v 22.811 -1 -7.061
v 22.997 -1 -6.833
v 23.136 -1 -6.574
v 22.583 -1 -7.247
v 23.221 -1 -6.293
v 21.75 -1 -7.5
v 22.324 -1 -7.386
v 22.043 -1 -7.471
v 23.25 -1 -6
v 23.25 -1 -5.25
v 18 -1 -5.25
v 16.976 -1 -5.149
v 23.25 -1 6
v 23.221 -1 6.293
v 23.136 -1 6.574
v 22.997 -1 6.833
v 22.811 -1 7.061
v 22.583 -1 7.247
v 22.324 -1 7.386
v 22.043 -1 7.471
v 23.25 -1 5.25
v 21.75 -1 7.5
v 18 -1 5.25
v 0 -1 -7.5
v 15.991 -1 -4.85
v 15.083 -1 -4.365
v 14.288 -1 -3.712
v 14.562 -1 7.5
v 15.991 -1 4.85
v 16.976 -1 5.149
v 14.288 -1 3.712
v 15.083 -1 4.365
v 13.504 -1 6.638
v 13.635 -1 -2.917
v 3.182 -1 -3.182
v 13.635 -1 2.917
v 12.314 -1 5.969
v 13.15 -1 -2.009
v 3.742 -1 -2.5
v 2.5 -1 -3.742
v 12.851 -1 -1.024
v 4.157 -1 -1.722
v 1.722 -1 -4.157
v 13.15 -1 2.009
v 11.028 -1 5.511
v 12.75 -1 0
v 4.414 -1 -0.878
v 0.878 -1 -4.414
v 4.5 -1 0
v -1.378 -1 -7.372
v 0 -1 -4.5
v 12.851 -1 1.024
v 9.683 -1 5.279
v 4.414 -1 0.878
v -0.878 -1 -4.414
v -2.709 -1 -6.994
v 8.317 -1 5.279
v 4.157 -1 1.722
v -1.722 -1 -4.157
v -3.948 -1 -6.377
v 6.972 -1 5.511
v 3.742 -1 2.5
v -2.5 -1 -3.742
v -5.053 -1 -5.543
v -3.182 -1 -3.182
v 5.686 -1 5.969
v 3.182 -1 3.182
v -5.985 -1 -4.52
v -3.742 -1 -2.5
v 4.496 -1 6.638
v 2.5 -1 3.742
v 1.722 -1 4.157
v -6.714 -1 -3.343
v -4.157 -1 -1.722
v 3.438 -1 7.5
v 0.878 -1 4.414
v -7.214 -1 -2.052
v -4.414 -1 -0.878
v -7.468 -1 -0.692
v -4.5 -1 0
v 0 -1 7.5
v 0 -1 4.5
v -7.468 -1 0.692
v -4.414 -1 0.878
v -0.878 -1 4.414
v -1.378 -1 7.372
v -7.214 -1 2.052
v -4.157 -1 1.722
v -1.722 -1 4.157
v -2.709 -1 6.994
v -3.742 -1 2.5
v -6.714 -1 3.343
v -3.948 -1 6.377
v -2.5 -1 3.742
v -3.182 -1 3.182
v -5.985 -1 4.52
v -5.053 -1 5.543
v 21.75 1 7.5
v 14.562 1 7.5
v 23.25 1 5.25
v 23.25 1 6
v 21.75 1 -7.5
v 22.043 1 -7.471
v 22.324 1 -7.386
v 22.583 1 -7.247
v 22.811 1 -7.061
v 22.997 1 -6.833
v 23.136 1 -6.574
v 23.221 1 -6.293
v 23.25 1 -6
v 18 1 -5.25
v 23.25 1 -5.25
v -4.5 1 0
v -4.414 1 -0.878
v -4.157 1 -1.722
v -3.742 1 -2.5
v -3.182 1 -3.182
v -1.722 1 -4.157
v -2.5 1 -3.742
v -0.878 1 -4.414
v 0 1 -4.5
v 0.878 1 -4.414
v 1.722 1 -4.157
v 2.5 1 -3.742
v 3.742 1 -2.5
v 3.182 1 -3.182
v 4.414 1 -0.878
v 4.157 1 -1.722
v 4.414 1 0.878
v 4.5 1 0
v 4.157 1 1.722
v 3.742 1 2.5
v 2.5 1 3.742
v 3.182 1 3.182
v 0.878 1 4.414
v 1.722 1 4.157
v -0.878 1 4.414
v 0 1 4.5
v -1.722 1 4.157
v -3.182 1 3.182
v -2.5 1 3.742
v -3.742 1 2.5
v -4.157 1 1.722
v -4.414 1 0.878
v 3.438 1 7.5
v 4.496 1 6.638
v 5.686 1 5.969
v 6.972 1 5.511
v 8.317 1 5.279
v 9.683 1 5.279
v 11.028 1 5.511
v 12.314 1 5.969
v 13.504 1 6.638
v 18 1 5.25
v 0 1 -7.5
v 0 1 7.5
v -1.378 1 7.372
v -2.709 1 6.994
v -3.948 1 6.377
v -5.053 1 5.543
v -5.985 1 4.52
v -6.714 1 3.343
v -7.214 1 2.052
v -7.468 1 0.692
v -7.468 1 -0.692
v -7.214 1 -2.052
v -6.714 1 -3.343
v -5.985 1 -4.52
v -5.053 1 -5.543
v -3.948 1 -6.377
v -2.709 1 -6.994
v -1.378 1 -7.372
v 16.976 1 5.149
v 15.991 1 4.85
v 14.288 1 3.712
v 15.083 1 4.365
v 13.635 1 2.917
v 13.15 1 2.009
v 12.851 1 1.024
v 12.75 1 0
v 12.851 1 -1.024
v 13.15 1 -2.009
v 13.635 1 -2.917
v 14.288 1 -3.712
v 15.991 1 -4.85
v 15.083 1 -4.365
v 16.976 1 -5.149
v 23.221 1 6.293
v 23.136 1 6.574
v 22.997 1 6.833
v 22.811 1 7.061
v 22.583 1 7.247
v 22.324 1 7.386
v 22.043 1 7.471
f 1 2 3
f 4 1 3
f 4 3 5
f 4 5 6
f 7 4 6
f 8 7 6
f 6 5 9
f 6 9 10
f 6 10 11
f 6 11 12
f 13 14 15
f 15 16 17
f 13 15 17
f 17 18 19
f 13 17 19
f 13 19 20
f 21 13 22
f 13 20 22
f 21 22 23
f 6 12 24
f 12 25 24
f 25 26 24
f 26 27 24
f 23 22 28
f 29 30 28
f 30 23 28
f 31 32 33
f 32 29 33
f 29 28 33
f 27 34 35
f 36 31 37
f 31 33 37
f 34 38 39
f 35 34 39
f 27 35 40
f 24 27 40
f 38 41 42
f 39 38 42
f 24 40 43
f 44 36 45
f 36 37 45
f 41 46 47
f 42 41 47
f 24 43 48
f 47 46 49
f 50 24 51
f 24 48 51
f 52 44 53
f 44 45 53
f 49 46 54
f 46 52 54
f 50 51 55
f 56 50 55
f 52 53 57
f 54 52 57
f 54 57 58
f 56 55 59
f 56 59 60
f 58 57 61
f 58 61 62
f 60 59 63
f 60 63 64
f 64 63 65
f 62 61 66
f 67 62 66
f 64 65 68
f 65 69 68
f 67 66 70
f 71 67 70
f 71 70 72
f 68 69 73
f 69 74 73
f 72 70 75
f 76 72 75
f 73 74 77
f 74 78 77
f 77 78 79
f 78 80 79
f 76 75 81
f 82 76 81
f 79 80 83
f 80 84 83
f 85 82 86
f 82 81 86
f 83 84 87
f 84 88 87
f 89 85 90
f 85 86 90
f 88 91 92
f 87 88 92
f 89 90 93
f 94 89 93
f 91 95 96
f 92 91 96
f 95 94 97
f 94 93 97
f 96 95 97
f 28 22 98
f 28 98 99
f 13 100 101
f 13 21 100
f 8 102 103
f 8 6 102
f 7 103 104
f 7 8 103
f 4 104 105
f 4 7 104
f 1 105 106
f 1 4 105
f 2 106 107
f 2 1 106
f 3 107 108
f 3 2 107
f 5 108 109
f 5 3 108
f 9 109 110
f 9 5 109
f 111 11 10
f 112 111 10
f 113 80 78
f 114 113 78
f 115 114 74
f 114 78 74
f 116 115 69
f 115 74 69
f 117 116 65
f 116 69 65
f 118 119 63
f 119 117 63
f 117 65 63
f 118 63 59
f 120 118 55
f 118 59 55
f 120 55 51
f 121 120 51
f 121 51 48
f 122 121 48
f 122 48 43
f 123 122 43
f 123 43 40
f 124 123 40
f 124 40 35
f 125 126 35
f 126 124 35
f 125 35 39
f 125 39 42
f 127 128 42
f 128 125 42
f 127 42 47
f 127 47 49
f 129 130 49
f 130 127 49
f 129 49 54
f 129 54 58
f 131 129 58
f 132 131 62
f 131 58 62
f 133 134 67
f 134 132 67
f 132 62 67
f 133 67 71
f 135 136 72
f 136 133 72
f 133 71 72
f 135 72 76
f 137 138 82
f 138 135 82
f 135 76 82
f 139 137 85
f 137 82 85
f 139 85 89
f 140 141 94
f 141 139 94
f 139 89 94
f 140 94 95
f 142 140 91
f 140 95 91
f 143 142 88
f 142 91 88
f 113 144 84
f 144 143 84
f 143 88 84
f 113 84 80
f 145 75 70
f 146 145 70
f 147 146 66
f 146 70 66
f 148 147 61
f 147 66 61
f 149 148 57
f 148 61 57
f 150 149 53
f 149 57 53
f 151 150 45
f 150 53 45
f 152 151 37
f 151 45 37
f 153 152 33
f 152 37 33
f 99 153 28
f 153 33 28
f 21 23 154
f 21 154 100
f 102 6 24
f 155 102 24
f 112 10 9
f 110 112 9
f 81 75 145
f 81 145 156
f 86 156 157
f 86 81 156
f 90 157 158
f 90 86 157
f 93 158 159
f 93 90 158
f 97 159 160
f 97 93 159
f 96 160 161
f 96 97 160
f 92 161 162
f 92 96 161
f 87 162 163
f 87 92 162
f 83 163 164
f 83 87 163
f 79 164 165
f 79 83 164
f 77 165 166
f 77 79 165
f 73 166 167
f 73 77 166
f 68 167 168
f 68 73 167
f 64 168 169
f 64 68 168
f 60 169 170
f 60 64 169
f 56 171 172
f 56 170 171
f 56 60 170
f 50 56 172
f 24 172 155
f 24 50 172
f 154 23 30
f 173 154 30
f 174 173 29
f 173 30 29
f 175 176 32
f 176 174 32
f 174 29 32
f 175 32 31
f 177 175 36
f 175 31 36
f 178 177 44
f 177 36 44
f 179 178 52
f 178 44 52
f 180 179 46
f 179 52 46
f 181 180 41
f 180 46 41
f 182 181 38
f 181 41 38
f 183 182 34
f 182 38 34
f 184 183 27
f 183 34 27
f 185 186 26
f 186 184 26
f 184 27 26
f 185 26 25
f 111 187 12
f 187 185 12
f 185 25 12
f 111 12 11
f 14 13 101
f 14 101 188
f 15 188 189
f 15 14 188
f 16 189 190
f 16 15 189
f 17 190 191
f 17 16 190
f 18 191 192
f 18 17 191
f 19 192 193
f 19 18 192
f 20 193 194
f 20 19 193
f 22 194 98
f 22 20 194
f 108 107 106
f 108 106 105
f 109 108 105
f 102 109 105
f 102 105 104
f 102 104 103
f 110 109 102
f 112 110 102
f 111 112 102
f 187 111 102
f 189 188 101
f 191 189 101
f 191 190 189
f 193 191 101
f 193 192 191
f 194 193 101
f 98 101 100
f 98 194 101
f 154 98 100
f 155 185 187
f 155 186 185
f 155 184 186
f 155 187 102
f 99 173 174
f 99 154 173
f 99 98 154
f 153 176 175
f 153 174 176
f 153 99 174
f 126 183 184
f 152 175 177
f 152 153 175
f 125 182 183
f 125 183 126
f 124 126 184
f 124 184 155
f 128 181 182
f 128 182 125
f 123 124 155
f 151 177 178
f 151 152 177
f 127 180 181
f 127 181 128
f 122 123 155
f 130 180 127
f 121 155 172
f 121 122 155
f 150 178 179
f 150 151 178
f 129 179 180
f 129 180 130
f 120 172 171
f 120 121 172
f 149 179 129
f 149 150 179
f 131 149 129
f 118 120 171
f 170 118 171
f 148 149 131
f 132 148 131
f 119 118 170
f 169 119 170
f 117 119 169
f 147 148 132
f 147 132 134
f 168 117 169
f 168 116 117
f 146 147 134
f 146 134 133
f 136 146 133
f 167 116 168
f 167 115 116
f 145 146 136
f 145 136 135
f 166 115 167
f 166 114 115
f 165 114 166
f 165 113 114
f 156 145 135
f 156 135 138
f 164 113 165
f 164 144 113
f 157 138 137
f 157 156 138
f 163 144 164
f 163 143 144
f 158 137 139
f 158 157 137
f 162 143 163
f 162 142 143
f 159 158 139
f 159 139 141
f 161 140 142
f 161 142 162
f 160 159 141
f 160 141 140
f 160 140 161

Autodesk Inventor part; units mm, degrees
ref_plane "YZ Plane" through (0, 0, 0) normal (1, 0, 0) x (0, 1, 0)
ref_plane "XZ Plane" through (0, 0, 0) normal (0, 1, 0) x (-1, 0, 0)
ref_plane "XY Plane" through (0, 0, 0) normal (0, 0, 1) x (1, 0, 0)
sketch "Skizze1" plane through (0, 0, 0) normal (0, 1, 0) x (-1, 0, 0)
  arc A0 (0, -7.5) -> (0, 7.5) centre (0, 0) ccw
  arc A1 (-18, -5.25) -> (-18, 5.25) centre (-18, 0) ccw
  line L0 (0, 7.5) -> (0, -7.5) construction
  line L1 (-18, 5.25) -> (-18, -5.25) construction
  line L2 (-18, 5.25) -> (-23.25, 5.25)
  line L3 (-18, -5.25) -> (-23.25, -5.25)
  line L4 (-23.25, 5.25) -> (-23.25, 6)
  line L5 (-23.25, -5.25) -> (-23.25, -6)
  line L6 (-21.75, -7.5) -> (0, -7.5)
  arc A2 (-21.75, 7.5) -> (-23.25, 6) centre (-21.75, 6) ccw
  arc A3 (-23.25, -6) -> (-21.75, -7.5) centre (-21.75, -6) ccw
  circle A4 centre (-18, 0) radius 5.25 construction
  circle A5 centre (0, 0) radius 4.5
  arc A6 (-14.5621, 7.5) -> (-3.4379, 7.5) centre (-9, 13.25) ccw
  line L7 (-21.75, 7.5) -> (-14.5621, 7.5)
  line L8 (-3.4379, 7.5) -> (0, 7.5)
  point P0 (-23.25, 0)
  point P1 (-9, 5.25)
  dimension "d4" = 10.5
  dimension "d0" = 15
  dimension "d1" = 10.5
  dimension "d2" = 18
  dimension "d3" = 1.5
  dimension "d5" = 9
  dimension "d8" = 8
  dimension "d9" = 9
extrude "Extrusion1" add sketch "Skizze1" along normal mid plane 2
properties part number "205 part 3" material "Gold"
